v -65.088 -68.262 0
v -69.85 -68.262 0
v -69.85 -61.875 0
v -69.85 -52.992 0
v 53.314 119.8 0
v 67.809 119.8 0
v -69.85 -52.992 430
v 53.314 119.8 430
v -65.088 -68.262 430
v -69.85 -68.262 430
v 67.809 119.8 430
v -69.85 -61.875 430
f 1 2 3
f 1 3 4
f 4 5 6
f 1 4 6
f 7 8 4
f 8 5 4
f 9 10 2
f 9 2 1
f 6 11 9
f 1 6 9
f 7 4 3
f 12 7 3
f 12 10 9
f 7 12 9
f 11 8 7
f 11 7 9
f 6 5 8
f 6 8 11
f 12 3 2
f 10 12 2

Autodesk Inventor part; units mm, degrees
ref_plane "YZ Plane" through (0, 0, 0) normal (1, 0, 0) x (0, 1, 0)
ref_plane "XZ Plane" through (0, 0, 0) normal (0, 1, 0) x (-1, 0, 0)
ref_plane "XY Plane" through (0, 0, 0) normal (0, 0, 1) x (1, 0, 0)
sketch "Sketch1" plane through (0, 0, 0) normal (0, 0, 1) x (1, 0, 0)
  line L0 (67.8086, 112.822) -> (-59.1914, -66.8193) projected
  line L1 (-69.85, 119.8) -> (69.85, 119.8) projected
  line L2 (67.8086, 119.8) -> (-65.0875, -68.2625)
  line L3 (-69.85, -61.8748) -> (-69.85, -68.2625)
  line L4 (-69.85, -68.2625) -> (-65.0875, -68.2625)
  line L5 (67.8086, 119.8) -> (53.3144, 119.8)
  line L6 (53.3144, 119.8) -> (-69.85, -52.9916)
  line L7 (-69.85, -52.9916) -> (-69.85, -61.8748)
  point P0 (0, 0)
extrude "Extrusion1" add sketch "Sketch1" along normal blind 430
properties part number "Backplane"
